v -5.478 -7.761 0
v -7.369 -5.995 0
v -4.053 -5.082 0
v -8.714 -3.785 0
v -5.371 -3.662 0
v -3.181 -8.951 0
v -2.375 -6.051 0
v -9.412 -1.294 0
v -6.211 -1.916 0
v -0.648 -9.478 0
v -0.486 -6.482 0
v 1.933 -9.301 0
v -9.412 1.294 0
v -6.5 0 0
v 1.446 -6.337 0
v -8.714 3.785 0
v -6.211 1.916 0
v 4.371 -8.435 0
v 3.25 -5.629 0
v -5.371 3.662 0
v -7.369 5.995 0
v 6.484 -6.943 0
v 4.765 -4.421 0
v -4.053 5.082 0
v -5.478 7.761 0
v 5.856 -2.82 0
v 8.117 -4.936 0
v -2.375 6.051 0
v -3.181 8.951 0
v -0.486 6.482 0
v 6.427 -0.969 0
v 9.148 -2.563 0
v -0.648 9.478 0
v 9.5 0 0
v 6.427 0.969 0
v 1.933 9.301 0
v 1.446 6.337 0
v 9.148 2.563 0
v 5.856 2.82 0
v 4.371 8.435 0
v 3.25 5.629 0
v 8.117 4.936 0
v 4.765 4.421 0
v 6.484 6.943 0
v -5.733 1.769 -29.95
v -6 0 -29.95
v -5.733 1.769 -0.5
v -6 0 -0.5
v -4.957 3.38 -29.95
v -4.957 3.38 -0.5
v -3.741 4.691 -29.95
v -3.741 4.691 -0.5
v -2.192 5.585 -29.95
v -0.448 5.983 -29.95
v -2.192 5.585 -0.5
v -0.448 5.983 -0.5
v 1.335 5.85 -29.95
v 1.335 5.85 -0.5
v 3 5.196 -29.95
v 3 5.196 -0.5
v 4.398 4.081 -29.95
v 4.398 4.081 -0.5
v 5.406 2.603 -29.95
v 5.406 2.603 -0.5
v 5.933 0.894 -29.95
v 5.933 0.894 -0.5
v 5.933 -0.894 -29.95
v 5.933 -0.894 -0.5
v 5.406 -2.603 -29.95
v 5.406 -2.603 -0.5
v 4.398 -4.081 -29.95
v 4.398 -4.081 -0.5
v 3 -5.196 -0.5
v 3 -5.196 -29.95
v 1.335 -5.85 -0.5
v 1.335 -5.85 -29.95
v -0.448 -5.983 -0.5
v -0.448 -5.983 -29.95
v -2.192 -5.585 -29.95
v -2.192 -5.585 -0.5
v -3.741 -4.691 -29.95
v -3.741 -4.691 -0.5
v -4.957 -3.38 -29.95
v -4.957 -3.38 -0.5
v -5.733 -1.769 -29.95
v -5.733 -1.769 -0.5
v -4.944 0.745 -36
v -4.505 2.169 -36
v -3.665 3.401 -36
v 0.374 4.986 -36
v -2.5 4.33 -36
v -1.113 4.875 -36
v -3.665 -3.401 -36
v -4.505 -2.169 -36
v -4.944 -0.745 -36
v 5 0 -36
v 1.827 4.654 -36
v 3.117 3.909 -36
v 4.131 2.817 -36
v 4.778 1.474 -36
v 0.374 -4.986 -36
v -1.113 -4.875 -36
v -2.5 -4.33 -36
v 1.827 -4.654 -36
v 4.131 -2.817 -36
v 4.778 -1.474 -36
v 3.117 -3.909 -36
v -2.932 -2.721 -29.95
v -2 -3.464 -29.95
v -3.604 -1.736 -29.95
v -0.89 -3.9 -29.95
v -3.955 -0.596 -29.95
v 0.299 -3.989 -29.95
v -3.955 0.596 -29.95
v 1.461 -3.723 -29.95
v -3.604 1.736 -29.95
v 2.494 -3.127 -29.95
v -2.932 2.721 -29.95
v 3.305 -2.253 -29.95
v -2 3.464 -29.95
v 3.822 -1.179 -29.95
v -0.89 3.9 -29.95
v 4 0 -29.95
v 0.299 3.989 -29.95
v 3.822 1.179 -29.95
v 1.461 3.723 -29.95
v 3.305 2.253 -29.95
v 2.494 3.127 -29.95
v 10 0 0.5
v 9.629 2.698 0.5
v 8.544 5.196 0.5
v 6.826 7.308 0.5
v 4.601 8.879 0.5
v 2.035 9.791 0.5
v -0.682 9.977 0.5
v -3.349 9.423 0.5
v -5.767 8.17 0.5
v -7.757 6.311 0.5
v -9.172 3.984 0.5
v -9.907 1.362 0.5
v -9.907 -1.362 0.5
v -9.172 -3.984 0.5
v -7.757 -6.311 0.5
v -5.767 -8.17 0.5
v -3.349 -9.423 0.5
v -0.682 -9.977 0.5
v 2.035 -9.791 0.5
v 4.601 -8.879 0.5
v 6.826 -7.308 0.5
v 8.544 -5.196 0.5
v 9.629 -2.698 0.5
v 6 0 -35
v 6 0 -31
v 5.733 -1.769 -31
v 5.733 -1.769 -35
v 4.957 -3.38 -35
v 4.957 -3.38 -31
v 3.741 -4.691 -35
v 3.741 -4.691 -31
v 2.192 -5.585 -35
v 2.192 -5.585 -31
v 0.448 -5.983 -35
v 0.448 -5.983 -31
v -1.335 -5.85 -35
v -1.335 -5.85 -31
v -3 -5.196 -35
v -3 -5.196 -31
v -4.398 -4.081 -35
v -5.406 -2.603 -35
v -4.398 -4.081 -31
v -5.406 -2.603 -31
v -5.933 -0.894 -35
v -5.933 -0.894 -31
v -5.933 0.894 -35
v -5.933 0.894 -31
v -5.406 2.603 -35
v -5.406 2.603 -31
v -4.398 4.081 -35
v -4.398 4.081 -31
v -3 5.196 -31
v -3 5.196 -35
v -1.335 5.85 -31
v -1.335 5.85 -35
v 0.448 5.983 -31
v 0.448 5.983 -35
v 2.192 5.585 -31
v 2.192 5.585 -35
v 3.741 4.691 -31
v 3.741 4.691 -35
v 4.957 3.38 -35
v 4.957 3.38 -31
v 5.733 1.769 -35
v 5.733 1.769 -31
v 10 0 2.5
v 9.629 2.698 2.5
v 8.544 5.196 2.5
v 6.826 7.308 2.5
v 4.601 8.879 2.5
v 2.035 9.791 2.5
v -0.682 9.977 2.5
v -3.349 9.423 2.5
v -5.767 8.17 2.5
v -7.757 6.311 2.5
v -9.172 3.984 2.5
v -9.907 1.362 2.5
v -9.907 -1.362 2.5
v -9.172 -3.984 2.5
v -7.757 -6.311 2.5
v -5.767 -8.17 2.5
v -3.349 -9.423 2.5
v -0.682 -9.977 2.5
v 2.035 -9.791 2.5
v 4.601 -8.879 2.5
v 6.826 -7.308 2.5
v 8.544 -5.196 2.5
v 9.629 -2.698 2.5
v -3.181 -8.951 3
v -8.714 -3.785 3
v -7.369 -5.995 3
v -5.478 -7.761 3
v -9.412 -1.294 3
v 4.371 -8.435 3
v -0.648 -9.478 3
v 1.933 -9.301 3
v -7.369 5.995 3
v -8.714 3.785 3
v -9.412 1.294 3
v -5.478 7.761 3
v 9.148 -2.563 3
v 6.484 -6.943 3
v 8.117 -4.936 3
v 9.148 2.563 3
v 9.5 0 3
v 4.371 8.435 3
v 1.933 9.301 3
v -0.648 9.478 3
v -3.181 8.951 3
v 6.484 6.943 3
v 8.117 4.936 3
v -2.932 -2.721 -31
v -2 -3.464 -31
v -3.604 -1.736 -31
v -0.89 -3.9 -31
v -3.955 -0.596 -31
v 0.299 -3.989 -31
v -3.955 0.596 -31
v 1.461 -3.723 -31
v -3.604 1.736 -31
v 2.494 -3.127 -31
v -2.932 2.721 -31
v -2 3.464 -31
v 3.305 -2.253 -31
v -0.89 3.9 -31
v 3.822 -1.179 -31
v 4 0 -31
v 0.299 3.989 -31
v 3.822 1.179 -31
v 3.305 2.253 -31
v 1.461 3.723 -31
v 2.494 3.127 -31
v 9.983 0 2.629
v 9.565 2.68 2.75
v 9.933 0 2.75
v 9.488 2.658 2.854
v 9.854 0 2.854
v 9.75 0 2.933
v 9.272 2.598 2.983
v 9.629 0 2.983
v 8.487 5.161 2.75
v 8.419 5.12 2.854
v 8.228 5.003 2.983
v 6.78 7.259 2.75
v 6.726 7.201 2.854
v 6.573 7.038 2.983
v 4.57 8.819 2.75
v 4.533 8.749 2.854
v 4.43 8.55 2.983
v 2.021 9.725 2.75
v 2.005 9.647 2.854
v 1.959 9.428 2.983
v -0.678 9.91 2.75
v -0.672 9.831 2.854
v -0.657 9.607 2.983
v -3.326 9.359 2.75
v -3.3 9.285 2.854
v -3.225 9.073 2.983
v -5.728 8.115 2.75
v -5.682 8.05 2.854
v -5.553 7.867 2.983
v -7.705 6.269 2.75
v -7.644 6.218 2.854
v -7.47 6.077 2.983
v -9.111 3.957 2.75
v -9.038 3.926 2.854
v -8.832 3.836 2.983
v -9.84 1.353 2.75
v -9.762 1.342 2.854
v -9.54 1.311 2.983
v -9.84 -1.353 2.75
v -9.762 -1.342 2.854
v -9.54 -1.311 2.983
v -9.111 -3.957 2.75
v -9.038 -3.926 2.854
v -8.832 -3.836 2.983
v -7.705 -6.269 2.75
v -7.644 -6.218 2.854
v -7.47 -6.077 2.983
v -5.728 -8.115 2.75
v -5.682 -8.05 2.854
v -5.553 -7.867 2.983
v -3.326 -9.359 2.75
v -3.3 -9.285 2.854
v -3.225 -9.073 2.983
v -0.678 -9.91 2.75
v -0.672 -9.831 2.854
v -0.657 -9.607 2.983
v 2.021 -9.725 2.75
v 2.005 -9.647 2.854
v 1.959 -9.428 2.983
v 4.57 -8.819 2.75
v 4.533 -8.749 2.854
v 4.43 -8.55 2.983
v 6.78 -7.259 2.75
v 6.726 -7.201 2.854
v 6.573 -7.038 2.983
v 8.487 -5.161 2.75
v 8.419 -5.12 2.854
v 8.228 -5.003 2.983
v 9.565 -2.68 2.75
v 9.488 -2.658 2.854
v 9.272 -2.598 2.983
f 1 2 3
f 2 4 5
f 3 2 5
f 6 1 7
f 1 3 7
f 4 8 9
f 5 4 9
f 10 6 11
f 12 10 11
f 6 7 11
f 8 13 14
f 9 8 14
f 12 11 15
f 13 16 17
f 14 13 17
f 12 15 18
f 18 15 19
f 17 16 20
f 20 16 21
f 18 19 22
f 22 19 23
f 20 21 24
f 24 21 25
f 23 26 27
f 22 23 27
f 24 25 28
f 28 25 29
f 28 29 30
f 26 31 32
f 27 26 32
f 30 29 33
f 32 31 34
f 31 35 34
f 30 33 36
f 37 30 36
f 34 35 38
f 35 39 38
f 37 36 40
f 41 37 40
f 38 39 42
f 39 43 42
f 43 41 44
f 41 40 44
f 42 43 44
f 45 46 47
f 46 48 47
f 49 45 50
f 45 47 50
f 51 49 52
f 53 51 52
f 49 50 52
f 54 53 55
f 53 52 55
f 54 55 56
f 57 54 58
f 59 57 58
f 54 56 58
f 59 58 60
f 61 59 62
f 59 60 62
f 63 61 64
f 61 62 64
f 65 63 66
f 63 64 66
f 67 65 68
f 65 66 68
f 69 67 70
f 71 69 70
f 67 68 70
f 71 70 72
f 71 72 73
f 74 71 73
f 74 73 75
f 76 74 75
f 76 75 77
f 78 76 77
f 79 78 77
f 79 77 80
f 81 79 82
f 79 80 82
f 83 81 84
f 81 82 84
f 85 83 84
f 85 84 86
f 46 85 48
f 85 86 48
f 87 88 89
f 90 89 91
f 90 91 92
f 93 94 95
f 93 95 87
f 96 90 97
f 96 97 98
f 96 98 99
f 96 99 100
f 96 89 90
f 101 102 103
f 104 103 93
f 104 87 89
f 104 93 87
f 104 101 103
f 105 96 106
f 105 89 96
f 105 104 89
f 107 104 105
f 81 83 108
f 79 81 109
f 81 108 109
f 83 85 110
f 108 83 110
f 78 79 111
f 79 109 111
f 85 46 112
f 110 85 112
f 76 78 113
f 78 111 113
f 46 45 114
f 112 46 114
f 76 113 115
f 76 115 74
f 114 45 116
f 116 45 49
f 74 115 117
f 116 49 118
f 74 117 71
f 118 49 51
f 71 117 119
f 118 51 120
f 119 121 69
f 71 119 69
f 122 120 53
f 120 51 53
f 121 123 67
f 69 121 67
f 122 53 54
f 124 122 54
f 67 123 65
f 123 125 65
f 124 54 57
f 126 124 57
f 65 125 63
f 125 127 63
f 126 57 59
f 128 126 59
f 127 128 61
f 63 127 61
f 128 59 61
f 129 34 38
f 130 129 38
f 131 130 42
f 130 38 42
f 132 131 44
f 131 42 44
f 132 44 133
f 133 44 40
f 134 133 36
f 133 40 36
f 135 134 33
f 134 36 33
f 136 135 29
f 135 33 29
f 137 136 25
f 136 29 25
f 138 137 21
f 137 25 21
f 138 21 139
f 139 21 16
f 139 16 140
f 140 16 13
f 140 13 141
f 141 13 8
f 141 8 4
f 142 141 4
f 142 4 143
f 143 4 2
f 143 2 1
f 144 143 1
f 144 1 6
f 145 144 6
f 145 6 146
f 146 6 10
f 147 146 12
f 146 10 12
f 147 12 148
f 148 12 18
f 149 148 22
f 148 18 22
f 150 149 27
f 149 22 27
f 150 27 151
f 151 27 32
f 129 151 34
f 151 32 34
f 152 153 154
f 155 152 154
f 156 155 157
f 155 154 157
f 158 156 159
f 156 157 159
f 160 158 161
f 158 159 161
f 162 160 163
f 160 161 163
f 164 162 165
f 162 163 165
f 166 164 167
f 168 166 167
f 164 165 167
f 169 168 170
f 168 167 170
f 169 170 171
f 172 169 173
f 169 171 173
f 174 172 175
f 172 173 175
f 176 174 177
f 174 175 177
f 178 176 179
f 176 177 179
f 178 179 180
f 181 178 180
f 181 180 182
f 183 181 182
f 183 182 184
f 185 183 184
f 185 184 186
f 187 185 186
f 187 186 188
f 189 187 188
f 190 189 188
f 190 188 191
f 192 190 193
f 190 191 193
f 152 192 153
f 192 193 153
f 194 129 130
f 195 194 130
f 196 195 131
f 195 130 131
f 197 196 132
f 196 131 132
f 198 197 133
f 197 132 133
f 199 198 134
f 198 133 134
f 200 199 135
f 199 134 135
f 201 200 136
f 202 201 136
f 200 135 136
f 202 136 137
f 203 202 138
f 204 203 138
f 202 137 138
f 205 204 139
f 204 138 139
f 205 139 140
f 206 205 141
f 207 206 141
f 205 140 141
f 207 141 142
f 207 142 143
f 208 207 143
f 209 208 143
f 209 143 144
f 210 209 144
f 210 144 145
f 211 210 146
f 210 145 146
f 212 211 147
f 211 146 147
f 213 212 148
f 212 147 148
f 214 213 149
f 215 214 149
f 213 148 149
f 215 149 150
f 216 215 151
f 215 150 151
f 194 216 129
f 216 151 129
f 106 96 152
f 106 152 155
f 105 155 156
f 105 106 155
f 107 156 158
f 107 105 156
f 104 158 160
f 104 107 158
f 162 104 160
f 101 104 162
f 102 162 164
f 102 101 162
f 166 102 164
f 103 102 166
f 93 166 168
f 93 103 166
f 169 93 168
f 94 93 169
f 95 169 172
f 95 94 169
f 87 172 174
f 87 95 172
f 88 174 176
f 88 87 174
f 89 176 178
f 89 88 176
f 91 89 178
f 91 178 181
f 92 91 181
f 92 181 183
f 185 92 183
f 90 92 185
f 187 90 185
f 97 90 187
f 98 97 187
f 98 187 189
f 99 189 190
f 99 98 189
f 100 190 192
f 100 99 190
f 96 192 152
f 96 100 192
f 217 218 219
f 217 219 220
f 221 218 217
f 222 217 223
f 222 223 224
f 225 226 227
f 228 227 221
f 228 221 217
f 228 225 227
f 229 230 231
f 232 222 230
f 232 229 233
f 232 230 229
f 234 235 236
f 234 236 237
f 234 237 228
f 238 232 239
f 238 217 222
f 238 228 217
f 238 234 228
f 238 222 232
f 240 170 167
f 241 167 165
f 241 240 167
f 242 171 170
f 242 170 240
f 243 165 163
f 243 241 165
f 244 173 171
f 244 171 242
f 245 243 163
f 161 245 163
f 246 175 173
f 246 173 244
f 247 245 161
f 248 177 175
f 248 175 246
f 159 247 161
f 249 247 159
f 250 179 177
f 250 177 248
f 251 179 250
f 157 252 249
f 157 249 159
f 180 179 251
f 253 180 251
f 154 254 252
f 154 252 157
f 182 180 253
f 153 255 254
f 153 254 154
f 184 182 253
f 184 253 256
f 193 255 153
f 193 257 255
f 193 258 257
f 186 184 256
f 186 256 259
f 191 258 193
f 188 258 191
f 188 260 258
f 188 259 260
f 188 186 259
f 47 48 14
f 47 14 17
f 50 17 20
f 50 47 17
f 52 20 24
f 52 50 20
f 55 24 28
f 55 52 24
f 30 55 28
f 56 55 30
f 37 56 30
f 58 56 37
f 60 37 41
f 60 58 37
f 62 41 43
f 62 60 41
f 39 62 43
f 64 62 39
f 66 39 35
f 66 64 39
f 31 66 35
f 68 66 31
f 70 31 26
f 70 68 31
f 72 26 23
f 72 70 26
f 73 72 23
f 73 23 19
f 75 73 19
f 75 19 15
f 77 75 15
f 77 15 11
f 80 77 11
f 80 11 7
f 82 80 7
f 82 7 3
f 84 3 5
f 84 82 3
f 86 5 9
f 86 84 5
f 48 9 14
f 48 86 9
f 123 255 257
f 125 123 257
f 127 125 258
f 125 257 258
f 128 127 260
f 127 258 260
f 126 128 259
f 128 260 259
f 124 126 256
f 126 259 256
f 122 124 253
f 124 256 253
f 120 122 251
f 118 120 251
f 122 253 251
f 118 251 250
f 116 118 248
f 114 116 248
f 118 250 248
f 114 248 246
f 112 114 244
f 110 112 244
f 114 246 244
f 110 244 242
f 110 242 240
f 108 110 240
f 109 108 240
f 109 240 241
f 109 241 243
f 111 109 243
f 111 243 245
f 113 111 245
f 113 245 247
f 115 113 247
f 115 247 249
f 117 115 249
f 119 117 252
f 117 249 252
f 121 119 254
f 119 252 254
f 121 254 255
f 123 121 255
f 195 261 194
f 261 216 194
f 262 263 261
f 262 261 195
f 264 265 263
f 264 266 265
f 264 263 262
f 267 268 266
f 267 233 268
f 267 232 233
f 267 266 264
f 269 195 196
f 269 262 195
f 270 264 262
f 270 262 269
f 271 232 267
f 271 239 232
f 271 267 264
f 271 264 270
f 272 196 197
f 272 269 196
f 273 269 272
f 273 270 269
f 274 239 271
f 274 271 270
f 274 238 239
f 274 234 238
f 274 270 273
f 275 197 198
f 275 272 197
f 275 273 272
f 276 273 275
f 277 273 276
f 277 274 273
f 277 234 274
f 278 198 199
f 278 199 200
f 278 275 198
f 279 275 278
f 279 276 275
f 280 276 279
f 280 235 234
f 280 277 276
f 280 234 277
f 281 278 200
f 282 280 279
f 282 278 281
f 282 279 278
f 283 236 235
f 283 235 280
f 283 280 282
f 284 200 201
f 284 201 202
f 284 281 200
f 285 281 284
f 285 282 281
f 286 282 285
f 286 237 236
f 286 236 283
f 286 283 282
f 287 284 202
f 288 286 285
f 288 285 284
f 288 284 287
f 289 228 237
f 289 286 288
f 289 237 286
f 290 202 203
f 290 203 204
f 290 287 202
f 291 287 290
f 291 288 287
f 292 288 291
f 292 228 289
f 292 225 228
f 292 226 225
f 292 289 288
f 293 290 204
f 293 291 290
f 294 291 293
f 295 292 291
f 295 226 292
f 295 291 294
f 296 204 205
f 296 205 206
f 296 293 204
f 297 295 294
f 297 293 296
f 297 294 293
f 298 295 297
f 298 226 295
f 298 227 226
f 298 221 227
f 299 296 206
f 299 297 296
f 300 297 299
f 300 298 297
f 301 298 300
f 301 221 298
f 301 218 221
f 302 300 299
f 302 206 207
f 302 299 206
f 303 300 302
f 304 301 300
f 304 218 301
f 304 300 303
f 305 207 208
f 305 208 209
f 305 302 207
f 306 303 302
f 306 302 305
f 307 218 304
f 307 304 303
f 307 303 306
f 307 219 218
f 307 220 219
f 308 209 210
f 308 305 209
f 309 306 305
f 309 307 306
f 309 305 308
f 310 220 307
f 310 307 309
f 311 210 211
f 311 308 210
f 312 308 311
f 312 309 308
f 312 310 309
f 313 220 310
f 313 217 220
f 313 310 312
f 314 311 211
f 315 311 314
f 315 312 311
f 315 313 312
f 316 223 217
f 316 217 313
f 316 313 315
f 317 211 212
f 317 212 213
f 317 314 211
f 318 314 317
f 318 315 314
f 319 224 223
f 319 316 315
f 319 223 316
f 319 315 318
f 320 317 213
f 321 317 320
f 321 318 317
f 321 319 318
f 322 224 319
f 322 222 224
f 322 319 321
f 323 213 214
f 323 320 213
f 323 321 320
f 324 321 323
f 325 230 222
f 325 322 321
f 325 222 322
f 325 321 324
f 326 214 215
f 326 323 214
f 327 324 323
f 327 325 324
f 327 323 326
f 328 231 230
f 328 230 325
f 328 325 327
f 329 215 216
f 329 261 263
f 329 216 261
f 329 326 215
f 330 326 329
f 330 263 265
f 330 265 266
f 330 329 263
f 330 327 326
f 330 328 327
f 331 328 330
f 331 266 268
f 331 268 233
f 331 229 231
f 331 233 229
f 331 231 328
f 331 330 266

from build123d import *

# Parameters (mm, degrees)
SKETCH1_R           = 10
BOSS_EXTRUDE1_DEPTH = 3
FILLET1_R           = 0.5
SKETCH2_R           = 6
BOSS_EXTRUDE2_DEPTH = 31
CHAMFER1_SIZE       = 0.5
SKETCH3_R           = 6
BOSS_EXTRUDE3_DEPTH = 5
SKETCH4_W           = 1.05
SKETCH4_H           = 2
CHAMFER2_SIZE       = 1


with BuildPart() as part:
    # Sketch1 → Boss-Extrude1 (new body)
    with BuildSketch(Plane.XY):
        Circle(SKETCH1_R)
    extrude(amount=BOSS_EXTRUDE1_DEPTH)

    # Fillet1
    fillet1_edges = [part.edges().sort_by_distance(p)[0] for p in [
        (-10, 0, 3),
    ]]
    fillet(fillet1_edges, radius=FILLET1_R)

    # Sketch2 → Boss-Extrude2 (add)
    with BuildSketch(Plane(origin=(0, 0, 0), x_dir=(-1, 0, 0), z_dir=(0, 0, -1))):
        Circle(SKETCH2_R)
    extrude(amount=BOSS_EXTRUDE2_DEPTH)

    # Chamfer1
    chamfer1_edges = [part.edges().sort_by_distance(p)[0] for p in [
        (-10, 0, 0),
        (6, 0, 0),
    ]]
    chamfer(chamfer1_edges, length=CHAMFER1_SIZE)

    # Sketch3 → Boss-Extrude3 (add)
    with BuildSketch(Plane(origin=(0, 0, -31), x_dir=(-1, 0, 0), z_dir=(0, 0, -1))):
        Circle(SKETCH3_R)
    extrude(amount=BOSS_EXTRUDE3_DEPTH)

    # Sketch4 → Cut-Revolve1 (revolve, cut)
    with BuildSketch(Plane(origin=(0, 0, 0), x_dir=(0, 0, -1), z_dir=(1, 0, 0))):
        with Locations((30.475, 5)):
            Rectangle(SKETCH4_W, SKETCH4_H)
    revolve(axis=Axis((0, 0, -36), (0, 0, 1)), mode=Mode.SUBTRACT)

    # Chamfer2
    chamfer2_edges = [part.edges().sort_by_distance(p)[0] for p in [
        (6, 0, -36),
    ]]
    chamfer(chamfer2_edges, length=CHAMFER2_SIZE)


solid = part.part
